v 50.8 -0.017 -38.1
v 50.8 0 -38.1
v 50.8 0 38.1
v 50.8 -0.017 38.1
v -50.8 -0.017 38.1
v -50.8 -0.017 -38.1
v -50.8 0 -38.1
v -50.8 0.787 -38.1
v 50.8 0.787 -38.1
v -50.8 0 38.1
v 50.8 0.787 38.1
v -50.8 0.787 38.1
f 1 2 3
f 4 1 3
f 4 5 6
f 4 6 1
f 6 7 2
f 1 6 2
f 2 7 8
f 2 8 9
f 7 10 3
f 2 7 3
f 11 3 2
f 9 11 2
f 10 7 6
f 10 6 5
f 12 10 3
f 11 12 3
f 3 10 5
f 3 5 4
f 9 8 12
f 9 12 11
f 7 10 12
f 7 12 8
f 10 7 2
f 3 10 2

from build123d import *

# Parameters (mm, degrees)
SKETCH1_W           = 101.6
SKETCH1_H           = 76.2
BOSS_EXTRUDE1_DEPTH = 0.7874
SKETCH2_W           = 101.6
SKETCH2_H           = 76.2
BOSS_EXTRUDE2_DEPTH = 0.017399


with BuildPart() as part:
    # Sketch1 → Boss-Extrude1 (new body)
    with BuildSketch(Plane(origin=(0, 0, 0), x_dir=(1, 0, 0), z_dir=(0, 1, 0))):
        Rectangle(SKETCH1_W, SKETCH1_H)
    extrude(amount=BOSS_EXTRUDE1_DEPTH)


with BuildPart() as body_2:
    # Sketch2 → Boss-Extrude2 (new body)
    with BuildSketch(Plane.XZ):
        Rectangle(SKETCH2_W, SKETCH2_H)
    extrude(amount=BOSS_EXTRUDE2_DEPTH)


solid = Compound([part.part, body_2.part])
